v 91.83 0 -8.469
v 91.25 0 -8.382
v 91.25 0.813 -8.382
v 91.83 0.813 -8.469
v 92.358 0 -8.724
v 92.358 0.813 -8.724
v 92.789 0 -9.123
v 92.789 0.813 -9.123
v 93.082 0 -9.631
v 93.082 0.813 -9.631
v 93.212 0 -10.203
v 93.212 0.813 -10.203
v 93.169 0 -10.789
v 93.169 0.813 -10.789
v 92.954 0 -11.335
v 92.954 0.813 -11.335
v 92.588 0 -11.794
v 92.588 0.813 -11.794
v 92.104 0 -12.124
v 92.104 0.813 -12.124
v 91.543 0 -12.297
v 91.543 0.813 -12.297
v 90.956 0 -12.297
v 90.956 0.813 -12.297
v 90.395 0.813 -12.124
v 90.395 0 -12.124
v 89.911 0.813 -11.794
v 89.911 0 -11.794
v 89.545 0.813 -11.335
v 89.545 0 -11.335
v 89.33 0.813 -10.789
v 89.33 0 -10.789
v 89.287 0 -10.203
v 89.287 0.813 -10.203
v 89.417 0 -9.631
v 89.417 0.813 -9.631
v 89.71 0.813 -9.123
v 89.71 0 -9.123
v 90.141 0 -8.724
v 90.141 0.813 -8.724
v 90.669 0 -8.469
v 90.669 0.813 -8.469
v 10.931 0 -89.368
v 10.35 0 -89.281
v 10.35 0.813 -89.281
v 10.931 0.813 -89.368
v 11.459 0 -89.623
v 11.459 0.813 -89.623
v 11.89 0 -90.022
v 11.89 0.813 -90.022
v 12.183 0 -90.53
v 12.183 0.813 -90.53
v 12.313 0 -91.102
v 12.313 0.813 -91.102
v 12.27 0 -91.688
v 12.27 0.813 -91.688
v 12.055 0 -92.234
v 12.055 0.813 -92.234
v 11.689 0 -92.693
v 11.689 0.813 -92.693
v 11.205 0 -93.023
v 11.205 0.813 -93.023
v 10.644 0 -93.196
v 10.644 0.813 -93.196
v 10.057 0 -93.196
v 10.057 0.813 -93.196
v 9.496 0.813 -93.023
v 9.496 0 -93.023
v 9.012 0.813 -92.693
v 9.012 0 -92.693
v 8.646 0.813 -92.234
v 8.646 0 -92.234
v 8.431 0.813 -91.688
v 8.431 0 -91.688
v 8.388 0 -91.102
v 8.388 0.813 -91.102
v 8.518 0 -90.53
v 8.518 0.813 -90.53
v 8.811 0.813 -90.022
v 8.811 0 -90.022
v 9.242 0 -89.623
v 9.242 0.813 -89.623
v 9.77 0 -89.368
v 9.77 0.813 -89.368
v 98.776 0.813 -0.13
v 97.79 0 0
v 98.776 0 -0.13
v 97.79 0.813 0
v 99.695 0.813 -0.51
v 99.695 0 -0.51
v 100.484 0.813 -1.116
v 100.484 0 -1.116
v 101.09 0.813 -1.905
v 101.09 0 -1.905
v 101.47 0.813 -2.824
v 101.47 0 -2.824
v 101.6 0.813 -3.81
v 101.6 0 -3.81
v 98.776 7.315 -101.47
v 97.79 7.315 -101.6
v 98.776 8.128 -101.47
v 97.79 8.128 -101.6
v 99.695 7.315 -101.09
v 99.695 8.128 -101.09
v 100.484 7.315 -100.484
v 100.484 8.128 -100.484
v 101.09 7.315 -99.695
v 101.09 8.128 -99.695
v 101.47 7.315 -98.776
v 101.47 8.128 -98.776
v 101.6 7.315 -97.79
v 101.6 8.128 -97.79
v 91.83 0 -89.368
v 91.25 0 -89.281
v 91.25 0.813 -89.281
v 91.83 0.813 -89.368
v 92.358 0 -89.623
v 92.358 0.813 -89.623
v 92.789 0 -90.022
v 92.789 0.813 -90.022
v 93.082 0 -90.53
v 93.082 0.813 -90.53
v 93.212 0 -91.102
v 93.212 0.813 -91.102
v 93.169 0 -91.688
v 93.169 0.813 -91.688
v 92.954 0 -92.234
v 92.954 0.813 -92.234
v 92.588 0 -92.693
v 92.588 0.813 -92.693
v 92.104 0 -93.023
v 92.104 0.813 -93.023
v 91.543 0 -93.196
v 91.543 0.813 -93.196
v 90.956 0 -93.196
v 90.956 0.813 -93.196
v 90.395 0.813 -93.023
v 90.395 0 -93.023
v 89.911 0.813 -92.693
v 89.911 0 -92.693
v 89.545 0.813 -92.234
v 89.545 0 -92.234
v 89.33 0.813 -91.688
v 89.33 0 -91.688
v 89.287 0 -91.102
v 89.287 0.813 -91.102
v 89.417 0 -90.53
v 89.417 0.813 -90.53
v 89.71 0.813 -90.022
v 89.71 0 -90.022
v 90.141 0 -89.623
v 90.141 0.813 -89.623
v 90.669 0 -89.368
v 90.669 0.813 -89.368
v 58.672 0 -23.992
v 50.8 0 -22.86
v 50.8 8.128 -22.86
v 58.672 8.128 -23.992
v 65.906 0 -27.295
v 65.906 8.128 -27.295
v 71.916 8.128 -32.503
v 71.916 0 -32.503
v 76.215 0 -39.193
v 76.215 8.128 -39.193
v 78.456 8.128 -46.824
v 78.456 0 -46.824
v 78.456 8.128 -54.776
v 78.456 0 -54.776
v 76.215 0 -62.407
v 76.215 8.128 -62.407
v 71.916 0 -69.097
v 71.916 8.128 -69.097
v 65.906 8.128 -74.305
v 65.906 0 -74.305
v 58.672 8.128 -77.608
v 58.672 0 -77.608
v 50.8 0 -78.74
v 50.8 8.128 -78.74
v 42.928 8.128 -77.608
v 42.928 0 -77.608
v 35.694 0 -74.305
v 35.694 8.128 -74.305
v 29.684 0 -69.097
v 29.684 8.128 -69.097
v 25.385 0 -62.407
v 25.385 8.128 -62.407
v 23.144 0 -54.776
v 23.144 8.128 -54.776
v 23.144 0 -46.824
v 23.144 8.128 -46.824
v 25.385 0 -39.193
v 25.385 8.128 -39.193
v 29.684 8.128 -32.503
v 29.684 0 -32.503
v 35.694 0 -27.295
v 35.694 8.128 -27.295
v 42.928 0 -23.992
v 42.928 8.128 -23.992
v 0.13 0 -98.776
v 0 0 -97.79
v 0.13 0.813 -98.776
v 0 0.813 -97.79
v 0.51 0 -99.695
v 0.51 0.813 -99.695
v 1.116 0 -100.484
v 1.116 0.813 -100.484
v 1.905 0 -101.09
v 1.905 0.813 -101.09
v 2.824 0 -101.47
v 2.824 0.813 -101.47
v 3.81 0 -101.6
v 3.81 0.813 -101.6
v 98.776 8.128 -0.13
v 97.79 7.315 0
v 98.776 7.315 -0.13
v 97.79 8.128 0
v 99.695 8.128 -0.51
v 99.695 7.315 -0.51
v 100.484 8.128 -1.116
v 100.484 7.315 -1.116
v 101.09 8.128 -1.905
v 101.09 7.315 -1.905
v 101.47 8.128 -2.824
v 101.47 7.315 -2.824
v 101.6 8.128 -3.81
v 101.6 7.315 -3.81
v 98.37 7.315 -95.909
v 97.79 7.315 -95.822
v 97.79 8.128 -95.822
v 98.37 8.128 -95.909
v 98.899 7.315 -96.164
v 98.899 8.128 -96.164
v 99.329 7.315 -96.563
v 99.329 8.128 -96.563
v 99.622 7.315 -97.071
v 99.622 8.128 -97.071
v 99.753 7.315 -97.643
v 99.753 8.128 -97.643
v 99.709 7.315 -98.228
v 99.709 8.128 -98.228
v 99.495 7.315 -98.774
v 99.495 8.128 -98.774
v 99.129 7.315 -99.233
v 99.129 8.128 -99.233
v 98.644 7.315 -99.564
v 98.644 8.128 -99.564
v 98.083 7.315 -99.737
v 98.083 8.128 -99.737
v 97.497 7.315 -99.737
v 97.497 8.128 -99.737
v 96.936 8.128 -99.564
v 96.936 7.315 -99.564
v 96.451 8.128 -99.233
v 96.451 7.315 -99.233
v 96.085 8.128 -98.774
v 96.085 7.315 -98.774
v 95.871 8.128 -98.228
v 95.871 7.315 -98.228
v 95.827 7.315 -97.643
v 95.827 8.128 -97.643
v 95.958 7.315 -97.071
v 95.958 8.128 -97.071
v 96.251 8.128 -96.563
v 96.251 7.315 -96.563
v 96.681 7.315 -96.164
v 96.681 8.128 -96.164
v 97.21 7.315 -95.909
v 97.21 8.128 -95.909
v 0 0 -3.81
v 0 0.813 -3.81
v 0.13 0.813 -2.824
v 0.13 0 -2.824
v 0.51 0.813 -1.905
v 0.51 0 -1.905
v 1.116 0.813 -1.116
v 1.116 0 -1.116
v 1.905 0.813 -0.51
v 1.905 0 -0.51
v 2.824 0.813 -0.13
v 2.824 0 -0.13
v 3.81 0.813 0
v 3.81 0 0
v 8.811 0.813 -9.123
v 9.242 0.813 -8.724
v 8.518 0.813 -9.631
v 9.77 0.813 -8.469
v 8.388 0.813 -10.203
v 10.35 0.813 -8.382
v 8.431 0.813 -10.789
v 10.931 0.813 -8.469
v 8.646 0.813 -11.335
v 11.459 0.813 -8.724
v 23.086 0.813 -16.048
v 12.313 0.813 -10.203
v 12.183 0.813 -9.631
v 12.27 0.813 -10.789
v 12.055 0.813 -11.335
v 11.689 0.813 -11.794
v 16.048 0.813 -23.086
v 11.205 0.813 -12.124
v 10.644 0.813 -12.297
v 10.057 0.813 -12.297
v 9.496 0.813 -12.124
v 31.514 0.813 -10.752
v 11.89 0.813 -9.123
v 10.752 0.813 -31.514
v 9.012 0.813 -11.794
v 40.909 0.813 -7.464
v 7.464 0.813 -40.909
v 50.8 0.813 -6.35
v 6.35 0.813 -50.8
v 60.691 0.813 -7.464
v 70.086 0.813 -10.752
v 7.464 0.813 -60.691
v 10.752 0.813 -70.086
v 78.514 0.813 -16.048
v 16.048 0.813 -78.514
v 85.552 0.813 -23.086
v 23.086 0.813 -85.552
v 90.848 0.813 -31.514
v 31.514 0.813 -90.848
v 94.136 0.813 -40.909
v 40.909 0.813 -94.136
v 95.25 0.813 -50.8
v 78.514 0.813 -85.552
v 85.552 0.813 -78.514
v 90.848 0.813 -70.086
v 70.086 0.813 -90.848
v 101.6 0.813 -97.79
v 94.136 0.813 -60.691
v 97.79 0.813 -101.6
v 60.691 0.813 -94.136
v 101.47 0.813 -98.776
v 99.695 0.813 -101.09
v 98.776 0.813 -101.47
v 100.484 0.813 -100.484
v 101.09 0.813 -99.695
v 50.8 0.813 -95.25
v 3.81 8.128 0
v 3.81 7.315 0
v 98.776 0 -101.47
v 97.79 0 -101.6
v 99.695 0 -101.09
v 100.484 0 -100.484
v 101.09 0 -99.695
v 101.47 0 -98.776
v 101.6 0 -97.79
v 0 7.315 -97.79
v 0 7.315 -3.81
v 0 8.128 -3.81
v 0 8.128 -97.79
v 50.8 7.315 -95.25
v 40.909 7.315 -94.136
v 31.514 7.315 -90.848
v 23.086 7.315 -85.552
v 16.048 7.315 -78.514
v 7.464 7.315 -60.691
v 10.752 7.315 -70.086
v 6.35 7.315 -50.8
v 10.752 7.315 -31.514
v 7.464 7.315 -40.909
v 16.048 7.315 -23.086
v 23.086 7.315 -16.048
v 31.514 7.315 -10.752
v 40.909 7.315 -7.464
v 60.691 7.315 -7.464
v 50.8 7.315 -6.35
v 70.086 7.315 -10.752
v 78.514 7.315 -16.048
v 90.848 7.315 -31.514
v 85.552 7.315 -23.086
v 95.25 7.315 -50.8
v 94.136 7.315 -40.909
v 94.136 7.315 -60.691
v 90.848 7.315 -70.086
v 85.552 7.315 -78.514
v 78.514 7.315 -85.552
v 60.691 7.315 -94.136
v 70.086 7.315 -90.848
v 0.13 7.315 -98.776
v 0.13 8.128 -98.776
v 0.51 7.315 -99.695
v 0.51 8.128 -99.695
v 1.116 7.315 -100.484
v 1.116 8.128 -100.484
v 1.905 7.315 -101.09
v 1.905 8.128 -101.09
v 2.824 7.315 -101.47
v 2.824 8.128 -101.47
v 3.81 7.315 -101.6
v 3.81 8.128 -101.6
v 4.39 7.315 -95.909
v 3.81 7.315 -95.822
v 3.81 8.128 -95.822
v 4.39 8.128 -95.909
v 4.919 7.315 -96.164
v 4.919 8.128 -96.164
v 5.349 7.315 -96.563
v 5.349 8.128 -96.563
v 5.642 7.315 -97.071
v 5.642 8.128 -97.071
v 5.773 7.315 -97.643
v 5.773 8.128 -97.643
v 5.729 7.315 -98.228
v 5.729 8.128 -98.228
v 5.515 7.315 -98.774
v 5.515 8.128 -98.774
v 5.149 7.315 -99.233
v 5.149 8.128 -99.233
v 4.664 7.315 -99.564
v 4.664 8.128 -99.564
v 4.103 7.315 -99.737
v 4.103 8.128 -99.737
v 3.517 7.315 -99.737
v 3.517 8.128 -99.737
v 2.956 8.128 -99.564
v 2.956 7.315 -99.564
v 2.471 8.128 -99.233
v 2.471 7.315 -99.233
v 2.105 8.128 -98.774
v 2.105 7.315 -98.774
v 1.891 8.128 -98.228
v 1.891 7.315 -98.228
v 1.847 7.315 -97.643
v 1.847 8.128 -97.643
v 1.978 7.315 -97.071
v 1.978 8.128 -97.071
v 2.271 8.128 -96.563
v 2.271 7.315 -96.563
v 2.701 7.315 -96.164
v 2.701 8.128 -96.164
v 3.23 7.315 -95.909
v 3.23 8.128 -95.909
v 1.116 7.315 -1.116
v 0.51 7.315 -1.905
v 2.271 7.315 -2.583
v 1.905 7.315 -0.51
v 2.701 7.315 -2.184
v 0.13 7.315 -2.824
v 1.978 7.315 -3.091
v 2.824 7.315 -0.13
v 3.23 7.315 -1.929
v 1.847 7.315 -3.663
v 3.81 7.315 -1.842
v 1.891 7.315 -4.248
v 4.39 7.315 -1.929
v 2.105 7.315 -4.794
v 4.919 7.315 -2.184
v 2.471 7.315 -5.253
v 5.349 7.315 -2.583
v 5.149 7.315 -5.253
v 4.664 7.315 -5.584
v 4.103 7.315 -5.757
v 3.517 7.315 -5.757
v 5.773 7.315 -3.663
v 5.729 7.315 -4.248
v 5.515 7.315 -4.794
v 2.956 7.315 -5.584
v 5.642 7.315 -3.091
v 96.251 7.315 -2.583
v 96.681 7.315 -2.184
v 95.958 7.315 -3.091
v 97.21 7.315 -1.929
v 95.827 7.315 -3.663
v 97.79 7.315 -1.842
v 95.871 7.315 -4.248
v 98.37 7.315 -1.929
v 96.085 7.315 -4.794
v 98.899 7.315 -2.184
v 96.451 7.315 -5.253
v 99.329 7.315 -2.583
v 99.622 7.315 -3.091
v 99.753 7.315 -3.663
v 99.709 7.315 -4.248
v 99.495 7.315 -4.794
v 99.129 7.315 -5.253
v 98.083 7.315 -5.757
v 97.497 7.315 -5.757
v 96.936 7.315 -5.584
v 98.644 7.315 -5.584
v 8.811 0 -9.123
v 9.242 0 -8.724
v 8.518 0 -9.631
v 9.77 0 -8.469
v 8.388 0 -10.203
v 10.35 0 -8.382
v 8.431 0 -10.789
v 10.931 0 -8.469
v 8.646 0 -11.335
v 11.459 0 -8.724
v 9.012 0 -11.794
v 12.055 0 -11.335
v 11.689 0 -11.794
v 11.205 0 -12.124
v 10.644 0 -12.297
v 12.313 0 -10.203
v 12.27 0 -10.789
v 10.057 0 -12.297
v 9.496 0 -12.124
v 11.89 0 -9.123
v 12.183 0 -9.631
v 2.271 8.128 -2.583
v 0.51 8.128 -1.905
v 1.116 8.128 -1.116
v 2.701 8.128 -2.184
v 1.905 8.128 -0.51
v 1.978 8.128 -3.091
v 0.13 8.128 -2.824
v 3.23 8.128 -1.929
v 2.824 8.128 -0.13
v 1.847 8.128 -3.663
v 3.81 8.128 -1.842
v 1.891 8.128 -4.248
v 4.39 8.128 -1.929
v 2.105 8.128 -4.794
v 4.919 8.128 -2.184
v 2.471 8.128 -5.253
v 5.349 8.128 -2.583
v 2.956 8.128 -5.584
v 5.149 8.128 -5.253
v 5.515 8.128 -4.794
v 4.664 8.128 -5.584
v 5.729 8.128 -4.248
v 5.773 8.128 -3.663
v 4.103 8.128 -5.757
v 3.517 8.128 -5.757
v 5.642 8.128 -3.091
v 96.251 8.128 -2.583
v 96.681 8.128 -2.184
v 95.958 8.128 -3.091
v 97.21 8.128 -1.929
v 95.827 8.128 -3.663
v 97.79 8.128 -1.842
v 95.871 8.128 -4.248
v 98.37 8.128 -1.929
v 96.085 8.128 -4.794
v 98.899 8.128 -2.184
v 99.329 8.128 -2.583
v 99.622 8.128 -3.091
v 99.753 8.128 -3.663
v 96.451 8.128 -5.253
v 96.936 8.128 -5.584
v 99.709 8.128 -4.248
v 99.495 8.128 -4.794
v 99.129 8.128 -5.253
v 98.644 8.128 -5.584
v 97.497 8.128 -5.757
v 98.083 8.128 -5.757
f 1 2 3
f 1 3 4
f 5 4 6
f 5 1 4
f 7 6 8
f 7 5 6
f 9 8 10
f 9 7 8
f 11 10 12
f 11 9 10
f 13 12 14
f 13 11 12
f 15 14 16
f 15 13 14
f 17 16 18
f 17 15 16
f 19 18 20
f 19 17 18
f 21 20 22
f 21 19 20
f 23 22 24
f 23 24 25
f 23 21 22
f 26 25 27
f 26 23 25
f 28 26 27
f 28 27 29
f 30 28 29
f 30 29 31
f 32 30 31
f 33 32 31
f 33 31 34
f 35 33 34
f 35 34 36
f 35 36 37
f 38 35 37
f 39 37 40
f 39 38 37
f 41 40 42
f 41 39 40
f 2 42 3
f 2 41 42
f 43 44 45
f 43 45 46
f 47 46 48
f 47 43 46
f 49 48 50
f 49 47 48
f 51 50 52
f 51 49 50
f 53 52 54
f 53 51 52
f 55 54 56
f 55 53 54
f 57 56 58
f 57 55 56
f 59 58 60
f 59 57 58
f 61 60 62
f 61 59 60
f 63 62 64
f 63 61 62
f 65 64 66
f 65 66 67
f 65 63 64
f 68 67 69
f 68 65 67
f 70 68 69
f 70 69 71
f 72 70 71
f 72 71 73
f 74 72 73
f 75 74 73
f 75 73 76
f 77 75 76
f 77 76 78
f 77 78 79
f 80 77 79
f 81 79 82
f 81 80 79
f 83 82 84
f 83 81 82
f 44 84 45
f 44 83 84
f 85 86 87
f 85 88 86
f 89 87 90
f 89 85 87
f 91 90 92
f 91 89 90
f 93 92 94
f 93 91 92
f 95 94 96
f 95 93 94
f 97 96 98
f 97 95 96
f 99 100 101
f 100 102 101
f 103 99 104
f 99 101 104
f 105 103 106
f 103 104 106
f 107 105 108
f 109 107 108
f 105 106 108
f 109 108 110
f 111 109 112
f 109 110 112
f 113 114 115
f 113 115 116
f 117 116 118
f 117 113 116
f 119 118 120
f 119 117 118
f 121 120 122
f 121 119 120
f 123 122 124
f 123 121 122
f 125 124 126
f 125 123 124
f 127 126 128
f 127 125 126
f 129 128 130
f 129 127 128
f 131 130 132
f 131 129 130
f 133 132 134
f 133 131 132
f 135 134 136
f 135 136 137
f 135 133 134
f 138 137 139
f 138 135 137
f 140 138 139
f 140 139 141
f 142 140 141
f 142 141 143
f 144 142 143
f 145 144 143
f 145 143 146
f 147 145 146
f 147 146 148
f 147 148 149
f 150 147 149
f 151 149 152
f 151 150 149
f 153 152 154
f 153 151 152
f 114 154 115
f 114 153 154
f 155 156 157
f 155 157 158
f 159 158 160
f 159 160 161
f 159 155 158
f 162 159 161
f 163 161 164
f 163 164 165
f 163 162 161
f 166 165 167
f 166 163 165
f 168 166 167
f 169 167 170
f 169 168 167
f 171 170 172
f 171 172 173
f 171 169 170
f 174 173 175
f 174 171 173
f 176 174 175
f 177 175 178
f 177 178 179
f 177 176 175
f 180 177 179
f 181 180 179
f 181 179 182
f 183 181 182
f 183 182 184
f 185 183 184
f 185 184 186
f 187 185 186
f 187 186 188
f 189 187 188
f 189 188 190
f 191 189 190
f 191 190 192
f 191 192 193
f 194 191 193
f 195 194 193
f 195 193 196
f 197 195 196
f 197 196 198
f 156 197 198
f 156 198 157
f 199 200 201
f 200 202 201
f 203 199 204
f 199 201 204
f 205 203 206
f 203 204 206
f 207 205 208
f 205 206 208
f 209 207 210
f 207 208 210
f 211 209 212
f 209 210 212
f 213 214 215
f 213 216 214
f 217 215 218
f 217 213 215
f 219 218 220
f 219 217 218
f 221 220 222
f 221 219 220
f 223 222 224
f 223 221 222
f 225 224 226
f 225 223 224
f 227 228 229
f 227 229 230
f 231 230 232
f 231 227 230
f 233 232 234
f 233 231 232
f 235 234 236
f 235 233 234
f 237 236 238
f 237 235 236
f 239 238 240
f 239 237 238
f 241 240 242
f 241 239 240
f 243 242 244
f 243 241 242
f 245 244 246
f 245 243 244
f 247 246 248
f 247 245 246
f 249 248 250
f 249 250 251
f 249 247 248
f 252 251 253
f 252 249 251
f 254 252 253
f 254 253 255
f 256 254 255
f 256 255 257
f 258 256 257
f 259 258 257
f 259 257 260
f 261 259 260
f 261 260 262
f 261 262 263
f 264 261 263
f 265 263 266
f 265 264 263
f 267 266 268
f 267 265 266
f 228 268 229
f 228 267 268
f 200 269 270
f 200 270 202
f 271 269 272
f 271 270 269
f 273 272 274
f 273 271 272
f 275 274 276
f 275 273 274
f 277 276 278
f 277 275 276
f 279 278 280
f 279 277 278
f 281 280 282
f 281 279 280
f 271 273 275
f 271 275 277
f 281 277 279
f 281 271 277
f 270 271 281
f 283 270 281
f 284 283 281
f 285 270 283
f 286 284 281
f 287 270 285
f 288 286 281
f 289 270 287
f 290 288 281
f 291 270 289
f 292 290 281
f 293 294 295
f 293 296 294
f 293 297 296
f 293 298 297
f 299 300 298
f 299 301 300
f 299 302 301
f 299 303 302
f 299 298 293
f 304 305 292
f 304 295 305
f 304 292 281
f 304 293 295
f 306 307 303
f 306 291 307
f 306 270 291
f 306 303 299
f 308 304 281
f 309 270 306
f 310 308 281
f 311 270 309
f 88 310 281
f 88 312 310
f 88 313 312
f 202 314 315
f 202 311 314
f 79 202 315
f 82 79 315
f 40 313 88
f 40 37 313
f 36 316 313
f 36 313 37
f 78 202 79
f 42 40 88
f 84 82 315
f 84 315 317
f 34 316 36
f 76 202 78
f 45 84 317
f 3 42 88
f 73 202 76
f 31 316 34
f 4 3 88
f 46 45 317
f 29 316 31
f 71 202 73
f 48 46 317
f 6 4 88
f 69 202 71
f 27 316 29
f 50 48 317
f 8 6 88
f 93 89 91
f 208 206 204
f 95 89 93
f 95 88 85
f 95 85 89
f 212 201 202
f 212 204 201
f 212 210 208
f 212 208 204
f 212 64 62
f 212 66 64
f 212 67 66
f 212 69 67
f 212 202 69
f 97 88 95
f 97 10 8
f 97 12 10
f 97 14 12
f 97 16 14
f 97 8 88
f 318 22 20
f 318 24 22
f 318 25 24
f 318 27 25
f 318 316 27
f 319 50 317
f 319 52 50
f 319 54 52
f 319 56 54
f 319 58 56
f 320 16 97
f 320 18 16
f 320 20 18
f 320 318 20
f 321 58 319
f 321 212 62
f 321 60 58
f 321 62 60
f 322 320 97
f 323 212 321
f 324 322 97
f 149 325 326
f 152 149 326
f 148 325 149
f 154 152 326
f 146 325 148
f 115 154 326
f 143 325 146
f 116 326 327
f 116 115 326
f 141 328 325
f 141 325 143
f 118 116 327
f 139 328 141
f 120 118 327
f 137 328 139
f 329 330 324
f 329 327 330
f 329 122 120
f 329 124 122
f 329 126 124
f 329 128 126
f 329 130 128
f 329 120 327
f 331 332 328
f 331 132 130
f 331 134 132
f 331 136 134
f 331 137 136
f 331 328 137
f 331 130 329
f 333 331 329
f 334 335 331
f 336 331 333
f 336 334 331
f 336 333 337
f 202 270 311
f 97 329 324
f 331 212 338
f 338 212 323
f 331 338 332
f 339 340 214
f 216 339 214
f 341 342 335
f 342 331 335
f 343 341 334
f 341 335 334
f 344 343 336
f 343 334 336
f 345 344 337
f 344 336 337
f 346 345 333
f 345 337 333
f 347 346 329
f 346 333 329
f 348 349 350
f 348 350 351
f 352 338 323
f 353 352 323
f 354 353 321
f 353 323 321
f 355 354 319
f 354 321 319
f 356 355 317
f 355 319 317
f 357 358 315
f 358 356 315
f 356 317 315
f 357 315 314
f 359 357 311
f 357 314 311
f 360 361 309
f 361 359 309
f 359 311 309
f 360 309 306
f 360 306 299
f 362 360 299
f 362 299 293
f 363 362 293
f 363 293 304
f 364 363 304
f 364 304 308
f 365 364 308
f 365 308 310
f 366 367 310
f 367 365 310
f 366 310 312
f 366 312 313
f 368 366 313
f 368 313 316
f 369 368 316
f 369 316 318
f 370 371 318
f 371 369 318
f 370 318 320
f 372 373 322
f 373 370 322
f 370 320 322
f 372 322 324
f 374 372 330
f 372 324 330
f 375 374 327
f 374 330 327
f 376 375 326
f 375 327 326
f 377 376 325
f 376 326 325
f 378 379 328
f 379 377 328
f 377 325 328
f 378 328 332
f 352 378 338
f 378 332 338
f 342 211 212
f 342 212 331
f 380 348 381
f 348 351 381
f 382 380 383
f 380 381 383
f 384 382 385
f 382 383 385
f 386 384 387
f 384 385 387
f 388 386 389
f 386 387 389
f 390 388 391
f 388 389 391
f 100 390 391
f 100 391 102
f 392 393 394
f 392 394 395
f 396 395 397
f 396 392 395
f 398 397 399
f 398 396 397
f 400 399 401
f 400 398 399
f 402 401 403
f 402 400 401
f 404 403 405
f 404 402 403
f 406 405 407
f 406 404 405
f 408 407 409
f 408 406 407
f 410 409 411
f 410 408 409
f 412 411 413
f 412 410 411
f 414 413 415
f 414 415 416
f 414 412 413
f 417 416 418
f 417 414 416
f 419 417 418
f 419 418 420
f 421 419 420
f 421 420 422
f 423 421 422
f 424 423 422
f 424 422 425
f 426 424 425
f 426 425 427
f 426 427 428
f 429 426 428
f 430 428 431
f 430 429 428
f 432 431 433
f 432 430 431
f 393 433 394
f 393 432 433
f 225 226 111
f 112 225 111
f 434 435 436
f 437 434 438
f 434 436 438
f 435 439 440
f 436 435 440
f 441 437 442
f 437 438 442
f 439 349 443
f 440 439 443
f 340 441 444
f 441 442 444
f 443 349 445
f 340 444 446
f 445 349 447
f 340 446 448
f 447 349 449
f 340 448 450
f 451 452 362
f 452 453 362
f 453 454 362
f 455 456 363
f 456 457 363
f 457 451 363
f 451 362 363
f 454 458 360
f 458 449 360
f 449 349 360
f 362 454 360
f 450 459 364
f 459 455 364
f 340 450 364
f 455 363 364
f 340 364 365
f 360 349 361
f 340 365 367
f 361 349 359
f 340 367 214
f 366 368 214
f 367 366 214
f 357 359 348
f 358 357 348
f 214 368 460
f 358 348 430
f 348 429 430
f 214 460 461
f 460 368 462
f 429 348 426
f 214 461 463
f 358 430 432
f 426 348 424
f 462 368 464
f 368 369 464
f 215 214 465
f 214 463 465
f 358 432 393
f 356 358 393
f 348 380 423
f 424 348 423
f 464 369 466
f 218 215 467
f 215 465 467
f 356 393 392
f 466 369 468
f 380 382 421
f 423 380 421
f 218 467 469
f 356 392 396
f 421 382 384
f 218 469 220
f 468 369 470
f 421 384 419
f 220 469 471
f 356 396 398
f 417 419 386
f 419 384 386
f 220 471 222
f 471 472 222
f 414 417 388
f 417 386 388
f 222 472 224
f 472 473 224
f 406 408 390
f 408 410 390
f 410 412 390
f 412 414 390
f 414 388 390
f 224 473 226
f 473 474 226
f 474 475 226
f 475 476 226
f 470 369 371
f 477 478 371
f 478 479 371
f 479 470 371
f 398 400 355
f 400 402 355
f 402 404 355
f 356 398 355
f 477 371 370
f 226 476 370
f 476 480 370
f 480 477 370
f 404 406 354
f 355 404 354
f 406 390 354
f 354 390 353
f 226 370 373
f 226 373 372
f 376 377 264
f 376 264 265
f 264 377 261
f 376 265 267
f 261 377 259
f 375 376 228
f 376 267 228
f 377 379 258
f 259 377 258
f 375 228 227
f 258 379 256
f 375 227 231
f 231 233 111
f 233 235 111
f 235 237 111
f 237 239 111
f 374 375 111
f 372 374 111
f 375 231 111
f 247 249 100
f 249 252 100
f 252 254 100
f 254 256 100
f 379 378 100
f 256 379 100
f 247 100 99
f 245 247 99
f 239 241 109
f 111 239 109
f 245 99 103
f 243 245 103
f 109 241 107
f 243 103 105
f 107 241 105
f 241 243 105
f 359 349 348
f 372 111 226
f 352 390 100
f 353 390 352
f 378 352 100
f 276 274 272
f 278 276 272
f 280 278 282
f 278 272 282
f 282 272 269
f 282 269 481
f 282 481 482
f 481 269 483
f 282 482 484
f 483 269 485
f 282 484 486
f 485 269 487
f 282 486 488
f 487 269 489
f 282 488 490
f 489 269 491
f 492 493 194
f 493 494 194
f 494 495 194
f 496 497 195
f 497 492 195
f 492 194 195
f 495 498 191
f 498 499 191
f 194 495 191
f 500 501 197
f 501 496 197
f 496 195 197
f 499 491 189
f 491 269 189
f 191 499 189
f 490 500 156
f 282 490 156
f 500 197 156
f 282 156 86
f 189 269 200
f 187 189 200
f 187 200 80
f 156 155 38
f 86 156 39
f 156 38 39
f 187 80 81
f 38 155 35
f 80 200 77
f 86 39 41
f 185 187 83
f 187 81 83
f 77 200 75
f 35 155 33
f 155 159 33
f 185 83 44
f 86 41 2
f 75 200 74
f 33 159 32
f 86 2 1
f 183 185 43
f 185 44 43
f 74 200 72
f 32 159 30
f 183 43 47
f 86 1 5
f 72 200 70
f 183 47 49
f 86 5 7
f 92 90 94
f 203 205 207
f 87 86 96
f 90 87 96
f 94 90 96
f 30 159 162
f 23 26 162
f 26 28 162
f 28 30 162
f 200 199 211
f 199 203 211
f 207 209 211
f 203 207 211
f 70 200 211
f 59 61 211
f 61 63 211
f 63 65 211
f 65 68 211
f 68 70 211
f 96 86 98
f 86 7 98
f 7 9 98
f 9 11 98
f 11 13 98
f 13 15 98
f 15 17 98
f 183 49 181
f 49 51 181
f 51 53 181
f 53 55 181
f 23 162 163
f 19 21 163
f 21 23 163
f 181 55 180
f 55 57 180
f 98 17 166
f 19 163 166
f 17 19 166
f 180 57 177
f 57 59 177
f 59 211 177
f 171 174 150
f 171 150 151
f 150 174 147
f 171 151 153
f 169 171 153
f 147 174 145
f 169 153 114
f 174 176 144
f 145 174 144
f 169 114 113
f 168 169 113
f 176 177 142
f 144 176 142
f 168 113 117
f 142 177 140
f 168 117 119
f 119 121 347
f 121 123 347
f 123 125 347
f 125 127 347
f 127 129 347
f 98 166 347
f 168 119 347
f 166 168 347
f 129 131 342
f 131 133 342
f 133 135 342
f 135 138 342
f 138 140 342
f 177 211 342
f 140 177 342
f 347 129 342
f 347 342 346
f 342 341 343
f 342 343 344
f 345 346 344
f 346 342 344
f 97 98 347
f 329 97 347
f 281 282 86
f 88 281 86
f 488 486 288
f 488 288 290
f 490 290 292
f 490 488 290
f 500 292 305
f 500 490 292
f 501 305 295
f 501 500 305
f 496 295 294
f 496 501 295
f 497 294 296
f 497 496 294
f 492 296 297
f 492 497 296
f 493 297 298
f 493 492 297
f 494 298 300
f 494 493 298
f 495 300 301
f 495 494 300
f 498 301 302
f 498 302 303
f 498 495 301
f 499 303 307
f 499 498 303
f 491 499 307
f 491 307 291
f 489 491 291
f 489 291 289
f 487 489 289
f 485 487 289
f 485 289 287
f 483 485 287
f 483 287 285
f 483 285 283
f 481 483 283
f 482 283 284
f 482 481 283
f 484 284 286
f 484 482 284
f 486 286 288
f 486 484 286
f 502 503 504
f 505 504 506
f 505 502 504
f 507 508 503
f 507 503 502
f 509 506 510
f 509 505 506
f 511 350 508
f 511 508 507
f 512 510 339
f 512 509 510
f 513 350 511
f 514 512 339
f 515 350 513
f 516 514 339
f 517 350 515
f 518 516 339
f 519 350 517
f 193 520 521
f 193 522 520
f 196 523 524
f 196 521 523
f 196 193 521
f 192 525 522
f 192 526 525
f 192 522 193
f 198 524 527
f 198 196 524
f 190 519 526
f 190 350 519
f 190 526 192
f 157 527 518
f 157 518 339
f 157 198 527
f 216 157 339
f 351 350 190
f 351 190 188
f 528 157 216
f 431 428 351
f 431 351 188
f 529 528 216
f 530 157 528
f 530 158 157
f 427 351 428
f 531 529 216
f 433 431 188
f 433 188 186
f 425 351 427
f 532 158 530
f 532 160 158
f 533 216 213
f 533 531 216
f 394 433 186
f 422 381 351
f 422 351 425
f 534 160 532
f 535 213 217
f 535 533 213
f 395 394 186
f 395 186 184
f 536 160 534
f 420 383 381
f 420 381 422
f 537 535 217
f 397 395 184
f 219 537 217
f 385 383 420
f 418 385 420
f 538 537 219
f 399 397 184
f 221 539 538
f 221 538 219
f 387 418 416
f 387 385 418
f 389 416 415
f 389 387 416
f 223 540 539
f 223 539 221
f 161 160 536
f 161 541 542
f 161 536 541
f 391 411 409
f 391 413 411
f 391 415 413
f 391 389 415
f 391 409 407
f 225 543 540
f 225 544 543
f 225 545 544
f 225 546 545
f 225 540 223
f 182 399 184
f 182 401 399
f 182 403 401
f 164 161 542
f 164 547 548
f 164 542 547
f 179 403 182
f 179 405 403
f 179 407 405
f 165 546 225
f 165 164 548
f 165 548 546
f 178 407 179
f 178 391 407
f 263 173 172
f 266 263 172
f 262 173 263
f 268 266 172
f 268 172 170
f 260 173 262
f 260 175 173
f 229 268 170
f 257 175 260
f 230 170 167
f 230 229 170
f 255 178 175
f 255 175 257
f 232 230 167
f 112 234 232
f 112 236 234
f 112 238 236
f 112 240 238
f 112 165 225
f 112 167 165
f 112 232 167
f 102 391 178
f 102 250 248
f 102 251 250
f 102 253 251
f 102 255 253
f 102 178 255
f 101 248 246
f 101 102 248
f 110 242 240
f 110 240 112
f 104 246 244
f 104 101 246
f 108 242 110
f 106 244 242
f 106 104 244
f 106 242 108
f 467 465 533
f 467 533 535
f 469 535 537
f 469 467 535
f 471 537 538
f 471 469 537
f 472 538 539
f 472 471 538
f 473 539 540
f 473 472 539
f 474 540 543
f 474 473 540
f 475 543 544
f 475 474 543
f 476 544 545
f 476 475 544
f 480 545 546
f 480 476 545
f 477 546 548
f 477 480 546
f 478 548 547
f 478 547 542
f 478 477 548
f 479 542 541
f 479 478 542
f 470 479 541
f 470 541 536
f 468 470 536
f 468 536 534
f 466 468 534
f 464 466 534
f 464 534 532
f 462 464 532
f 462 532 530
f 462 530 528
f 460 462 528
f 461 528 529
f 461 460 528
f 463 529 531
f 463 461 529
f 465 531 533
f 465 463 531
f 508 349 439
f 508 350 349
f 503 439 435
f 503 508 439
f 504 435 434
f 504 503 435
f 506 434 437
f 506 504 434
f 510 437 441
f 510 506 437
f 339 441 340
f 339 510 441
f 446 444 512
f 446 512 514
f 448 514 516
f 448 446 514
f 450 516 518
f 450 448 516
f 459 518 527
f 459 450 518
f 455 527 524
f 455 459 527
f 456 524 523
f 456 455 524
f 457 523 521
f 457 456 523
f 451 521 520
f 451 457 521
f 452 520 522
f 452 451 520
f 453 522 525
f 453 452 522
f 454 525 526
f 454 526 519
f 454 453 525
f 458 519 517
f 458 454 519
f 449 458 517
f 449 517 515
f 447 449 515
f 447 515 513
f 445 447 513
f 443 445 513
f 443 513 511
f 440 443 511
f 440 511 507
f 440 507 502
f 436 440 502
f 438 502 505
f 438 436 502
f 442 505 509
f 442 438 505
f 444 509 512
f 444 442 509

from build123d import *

# Parameters (mm, degrees)
LOWER_DECK_W        = 101.6
LOWER_DECK_H        = 101.6
LOWER_DECK_R        = 1.9685
LOWER_DECK_R_2      = 27.94
BOSS_EXTRUDE1_DEPTH = 0.8128
FILLET1_R           = 3.81
SKETCH2_W           = 101.6
SKETCH2_H           = 101.6
SKETCH2_R           = 27.94
SKETCH2_R_2         = 1.9685
BOSS_EXTRUDE2_DEPTH = 0.8128
FILLET3_R           = 3.81
BOSS_EXTRUDE3_REACH = 145.87
SKETCH3_R           = 44.45
SKETCH3_R_2         = 27.94


with BuildPart() as part:
    # Lower_Deck → Boss-Extrude1 (new body)
    with BuildSketch(Plane(origin=(0, 0, 0), x_dir=(1, 0, 0), z_dir=(0, 1, 0))):
        with Locations((50.8, 50.8)):
            Rectangle(LOWER_DECK_W, LOWER_DECK_H)
        with Locations(Location((10.3505, 10.3505, 0), (0, 0, 270))):
            Circle(LOWER_DECK_R, mode=Mode.SUBTRACT)
        with Locations(Location((10.3505, 91.2495, 0), (0, 0, 270))):
            Circle(LOWER_DECK_R, mode=Mode.SUBTRACT)
        with Locations(Location((91.2495, 10.3505, 0), (0, 0, 270))):
            Circle(LOWER_DECK_R, mode=Mode.SUBTRACT)
        with Locations(Location((91.2495, 91.2495, 0), (0, 0, 270))):
            Circle(LOWER_DECK_R, mode=Mode.SUBTRACT)
        with Locations(Location((50.8, 50.8, 0), (0, 0, 270))):
            Circle(LOWER_DECK_R_2, mode=Mode.SUBTRACT)
    extrude(amount=BOSS_EXTRUDE1_DEPTH)

    # Fillet1
    fillet1_edges = [part.edges().sort_by_distance(p)[0] for p in [
        (0, 0.4064, -101.6),
        (101.6, 0.4064, -101.6),
        (101.6, 0.4064, 0),
        (0, 0.4064, 0),
    ]]
    fillet(fillet1_edges, radius=FILLET1_R)


with BuildPart() as body_2:
    # Sketch2 → Boss-Extrude2 (new body)
    with BuildSketch(Plane(origin=(0, 7.3152, 0), x_dir=(1, 0, 0), z_dir=(0, 1, 0))):
        with Locations((50.8, 50.8)):
            Rectangle(SKETCH2_W, SKETCH2_H)
        with Locations(Location((50.8, 50.8, 0), (0, 0, 270))):
            Circle(SKETCH2_R, mode=Mode.SUBTRACT)
        with Locations(Location((3.81, 3.81, 0), (0, 0, 270))):
            Circle(SKETCH2_R_2, mode=Mode.SUBTRACT)
        with Locations(Location((3.81, 97.79, 0), (0, 0, 270))):
            Circle(SKETCH2_R_2, mode=Mode.SUBTRACT)
        with Locations(Location((97.79, 97.79, 0), (0, 0, 270))):
            Circle(SKETCH2_R_2, mode=Mode.SUBTRACT)
        with Locations(Location((97.79, 3.81, 0), (0, 0, 270))):
            Circle(SKETCH2_R_2, mode=Mode.SUBTRACT)
    extrude(amount=BOSS_EXTRUDE2_DEPTH)

    # Fillet3
    fillet3_edges = [body_2.edges().sort_by_distance(p)[0] for p in [
        (0, 7.7216, -101.6),
        (101.6, 7.7216, -101.6),
        (101.6, 7.7216, 0),
        (0, 7.7216, 0),
    ]]
    fillet(fillet3_edges, radius=FILLET3_R)

    # Sketch3 → Boss-Extrude3 (add, up to next)
    with BuildSketch(Plane(origin=(0, 0.8128, 0), x_dir=(1, 0, 0), z_dir=(0, 1, 0)), mode=Mode.PRIVATE) as boss_extrude3_sk1:
        with Locations(Location((50.8, 50.8, 0), (0, 0, 90))):
            Circle(SKETCH3_R)
        with Locations(Location((50.8, 50.8, 0), (0, 0, 270))):
            Circle(SKETCH3_R_2, mode=Mode.SUBTRACT)
    boss_extrude3_tool1 = extrude(boss_extrude3_sk1.sketch, amount=BOSS_EXTRUDE3_REACH, mode=Mode.PRIVATE) - body_2.part

    add(part.part)  # Boss-Extrude3 merges part
    add(boss_extrude3_tool1.solids().sort_by_distance((50.8, 0.8128, -7.607236))[0])


solid = body_2.part
